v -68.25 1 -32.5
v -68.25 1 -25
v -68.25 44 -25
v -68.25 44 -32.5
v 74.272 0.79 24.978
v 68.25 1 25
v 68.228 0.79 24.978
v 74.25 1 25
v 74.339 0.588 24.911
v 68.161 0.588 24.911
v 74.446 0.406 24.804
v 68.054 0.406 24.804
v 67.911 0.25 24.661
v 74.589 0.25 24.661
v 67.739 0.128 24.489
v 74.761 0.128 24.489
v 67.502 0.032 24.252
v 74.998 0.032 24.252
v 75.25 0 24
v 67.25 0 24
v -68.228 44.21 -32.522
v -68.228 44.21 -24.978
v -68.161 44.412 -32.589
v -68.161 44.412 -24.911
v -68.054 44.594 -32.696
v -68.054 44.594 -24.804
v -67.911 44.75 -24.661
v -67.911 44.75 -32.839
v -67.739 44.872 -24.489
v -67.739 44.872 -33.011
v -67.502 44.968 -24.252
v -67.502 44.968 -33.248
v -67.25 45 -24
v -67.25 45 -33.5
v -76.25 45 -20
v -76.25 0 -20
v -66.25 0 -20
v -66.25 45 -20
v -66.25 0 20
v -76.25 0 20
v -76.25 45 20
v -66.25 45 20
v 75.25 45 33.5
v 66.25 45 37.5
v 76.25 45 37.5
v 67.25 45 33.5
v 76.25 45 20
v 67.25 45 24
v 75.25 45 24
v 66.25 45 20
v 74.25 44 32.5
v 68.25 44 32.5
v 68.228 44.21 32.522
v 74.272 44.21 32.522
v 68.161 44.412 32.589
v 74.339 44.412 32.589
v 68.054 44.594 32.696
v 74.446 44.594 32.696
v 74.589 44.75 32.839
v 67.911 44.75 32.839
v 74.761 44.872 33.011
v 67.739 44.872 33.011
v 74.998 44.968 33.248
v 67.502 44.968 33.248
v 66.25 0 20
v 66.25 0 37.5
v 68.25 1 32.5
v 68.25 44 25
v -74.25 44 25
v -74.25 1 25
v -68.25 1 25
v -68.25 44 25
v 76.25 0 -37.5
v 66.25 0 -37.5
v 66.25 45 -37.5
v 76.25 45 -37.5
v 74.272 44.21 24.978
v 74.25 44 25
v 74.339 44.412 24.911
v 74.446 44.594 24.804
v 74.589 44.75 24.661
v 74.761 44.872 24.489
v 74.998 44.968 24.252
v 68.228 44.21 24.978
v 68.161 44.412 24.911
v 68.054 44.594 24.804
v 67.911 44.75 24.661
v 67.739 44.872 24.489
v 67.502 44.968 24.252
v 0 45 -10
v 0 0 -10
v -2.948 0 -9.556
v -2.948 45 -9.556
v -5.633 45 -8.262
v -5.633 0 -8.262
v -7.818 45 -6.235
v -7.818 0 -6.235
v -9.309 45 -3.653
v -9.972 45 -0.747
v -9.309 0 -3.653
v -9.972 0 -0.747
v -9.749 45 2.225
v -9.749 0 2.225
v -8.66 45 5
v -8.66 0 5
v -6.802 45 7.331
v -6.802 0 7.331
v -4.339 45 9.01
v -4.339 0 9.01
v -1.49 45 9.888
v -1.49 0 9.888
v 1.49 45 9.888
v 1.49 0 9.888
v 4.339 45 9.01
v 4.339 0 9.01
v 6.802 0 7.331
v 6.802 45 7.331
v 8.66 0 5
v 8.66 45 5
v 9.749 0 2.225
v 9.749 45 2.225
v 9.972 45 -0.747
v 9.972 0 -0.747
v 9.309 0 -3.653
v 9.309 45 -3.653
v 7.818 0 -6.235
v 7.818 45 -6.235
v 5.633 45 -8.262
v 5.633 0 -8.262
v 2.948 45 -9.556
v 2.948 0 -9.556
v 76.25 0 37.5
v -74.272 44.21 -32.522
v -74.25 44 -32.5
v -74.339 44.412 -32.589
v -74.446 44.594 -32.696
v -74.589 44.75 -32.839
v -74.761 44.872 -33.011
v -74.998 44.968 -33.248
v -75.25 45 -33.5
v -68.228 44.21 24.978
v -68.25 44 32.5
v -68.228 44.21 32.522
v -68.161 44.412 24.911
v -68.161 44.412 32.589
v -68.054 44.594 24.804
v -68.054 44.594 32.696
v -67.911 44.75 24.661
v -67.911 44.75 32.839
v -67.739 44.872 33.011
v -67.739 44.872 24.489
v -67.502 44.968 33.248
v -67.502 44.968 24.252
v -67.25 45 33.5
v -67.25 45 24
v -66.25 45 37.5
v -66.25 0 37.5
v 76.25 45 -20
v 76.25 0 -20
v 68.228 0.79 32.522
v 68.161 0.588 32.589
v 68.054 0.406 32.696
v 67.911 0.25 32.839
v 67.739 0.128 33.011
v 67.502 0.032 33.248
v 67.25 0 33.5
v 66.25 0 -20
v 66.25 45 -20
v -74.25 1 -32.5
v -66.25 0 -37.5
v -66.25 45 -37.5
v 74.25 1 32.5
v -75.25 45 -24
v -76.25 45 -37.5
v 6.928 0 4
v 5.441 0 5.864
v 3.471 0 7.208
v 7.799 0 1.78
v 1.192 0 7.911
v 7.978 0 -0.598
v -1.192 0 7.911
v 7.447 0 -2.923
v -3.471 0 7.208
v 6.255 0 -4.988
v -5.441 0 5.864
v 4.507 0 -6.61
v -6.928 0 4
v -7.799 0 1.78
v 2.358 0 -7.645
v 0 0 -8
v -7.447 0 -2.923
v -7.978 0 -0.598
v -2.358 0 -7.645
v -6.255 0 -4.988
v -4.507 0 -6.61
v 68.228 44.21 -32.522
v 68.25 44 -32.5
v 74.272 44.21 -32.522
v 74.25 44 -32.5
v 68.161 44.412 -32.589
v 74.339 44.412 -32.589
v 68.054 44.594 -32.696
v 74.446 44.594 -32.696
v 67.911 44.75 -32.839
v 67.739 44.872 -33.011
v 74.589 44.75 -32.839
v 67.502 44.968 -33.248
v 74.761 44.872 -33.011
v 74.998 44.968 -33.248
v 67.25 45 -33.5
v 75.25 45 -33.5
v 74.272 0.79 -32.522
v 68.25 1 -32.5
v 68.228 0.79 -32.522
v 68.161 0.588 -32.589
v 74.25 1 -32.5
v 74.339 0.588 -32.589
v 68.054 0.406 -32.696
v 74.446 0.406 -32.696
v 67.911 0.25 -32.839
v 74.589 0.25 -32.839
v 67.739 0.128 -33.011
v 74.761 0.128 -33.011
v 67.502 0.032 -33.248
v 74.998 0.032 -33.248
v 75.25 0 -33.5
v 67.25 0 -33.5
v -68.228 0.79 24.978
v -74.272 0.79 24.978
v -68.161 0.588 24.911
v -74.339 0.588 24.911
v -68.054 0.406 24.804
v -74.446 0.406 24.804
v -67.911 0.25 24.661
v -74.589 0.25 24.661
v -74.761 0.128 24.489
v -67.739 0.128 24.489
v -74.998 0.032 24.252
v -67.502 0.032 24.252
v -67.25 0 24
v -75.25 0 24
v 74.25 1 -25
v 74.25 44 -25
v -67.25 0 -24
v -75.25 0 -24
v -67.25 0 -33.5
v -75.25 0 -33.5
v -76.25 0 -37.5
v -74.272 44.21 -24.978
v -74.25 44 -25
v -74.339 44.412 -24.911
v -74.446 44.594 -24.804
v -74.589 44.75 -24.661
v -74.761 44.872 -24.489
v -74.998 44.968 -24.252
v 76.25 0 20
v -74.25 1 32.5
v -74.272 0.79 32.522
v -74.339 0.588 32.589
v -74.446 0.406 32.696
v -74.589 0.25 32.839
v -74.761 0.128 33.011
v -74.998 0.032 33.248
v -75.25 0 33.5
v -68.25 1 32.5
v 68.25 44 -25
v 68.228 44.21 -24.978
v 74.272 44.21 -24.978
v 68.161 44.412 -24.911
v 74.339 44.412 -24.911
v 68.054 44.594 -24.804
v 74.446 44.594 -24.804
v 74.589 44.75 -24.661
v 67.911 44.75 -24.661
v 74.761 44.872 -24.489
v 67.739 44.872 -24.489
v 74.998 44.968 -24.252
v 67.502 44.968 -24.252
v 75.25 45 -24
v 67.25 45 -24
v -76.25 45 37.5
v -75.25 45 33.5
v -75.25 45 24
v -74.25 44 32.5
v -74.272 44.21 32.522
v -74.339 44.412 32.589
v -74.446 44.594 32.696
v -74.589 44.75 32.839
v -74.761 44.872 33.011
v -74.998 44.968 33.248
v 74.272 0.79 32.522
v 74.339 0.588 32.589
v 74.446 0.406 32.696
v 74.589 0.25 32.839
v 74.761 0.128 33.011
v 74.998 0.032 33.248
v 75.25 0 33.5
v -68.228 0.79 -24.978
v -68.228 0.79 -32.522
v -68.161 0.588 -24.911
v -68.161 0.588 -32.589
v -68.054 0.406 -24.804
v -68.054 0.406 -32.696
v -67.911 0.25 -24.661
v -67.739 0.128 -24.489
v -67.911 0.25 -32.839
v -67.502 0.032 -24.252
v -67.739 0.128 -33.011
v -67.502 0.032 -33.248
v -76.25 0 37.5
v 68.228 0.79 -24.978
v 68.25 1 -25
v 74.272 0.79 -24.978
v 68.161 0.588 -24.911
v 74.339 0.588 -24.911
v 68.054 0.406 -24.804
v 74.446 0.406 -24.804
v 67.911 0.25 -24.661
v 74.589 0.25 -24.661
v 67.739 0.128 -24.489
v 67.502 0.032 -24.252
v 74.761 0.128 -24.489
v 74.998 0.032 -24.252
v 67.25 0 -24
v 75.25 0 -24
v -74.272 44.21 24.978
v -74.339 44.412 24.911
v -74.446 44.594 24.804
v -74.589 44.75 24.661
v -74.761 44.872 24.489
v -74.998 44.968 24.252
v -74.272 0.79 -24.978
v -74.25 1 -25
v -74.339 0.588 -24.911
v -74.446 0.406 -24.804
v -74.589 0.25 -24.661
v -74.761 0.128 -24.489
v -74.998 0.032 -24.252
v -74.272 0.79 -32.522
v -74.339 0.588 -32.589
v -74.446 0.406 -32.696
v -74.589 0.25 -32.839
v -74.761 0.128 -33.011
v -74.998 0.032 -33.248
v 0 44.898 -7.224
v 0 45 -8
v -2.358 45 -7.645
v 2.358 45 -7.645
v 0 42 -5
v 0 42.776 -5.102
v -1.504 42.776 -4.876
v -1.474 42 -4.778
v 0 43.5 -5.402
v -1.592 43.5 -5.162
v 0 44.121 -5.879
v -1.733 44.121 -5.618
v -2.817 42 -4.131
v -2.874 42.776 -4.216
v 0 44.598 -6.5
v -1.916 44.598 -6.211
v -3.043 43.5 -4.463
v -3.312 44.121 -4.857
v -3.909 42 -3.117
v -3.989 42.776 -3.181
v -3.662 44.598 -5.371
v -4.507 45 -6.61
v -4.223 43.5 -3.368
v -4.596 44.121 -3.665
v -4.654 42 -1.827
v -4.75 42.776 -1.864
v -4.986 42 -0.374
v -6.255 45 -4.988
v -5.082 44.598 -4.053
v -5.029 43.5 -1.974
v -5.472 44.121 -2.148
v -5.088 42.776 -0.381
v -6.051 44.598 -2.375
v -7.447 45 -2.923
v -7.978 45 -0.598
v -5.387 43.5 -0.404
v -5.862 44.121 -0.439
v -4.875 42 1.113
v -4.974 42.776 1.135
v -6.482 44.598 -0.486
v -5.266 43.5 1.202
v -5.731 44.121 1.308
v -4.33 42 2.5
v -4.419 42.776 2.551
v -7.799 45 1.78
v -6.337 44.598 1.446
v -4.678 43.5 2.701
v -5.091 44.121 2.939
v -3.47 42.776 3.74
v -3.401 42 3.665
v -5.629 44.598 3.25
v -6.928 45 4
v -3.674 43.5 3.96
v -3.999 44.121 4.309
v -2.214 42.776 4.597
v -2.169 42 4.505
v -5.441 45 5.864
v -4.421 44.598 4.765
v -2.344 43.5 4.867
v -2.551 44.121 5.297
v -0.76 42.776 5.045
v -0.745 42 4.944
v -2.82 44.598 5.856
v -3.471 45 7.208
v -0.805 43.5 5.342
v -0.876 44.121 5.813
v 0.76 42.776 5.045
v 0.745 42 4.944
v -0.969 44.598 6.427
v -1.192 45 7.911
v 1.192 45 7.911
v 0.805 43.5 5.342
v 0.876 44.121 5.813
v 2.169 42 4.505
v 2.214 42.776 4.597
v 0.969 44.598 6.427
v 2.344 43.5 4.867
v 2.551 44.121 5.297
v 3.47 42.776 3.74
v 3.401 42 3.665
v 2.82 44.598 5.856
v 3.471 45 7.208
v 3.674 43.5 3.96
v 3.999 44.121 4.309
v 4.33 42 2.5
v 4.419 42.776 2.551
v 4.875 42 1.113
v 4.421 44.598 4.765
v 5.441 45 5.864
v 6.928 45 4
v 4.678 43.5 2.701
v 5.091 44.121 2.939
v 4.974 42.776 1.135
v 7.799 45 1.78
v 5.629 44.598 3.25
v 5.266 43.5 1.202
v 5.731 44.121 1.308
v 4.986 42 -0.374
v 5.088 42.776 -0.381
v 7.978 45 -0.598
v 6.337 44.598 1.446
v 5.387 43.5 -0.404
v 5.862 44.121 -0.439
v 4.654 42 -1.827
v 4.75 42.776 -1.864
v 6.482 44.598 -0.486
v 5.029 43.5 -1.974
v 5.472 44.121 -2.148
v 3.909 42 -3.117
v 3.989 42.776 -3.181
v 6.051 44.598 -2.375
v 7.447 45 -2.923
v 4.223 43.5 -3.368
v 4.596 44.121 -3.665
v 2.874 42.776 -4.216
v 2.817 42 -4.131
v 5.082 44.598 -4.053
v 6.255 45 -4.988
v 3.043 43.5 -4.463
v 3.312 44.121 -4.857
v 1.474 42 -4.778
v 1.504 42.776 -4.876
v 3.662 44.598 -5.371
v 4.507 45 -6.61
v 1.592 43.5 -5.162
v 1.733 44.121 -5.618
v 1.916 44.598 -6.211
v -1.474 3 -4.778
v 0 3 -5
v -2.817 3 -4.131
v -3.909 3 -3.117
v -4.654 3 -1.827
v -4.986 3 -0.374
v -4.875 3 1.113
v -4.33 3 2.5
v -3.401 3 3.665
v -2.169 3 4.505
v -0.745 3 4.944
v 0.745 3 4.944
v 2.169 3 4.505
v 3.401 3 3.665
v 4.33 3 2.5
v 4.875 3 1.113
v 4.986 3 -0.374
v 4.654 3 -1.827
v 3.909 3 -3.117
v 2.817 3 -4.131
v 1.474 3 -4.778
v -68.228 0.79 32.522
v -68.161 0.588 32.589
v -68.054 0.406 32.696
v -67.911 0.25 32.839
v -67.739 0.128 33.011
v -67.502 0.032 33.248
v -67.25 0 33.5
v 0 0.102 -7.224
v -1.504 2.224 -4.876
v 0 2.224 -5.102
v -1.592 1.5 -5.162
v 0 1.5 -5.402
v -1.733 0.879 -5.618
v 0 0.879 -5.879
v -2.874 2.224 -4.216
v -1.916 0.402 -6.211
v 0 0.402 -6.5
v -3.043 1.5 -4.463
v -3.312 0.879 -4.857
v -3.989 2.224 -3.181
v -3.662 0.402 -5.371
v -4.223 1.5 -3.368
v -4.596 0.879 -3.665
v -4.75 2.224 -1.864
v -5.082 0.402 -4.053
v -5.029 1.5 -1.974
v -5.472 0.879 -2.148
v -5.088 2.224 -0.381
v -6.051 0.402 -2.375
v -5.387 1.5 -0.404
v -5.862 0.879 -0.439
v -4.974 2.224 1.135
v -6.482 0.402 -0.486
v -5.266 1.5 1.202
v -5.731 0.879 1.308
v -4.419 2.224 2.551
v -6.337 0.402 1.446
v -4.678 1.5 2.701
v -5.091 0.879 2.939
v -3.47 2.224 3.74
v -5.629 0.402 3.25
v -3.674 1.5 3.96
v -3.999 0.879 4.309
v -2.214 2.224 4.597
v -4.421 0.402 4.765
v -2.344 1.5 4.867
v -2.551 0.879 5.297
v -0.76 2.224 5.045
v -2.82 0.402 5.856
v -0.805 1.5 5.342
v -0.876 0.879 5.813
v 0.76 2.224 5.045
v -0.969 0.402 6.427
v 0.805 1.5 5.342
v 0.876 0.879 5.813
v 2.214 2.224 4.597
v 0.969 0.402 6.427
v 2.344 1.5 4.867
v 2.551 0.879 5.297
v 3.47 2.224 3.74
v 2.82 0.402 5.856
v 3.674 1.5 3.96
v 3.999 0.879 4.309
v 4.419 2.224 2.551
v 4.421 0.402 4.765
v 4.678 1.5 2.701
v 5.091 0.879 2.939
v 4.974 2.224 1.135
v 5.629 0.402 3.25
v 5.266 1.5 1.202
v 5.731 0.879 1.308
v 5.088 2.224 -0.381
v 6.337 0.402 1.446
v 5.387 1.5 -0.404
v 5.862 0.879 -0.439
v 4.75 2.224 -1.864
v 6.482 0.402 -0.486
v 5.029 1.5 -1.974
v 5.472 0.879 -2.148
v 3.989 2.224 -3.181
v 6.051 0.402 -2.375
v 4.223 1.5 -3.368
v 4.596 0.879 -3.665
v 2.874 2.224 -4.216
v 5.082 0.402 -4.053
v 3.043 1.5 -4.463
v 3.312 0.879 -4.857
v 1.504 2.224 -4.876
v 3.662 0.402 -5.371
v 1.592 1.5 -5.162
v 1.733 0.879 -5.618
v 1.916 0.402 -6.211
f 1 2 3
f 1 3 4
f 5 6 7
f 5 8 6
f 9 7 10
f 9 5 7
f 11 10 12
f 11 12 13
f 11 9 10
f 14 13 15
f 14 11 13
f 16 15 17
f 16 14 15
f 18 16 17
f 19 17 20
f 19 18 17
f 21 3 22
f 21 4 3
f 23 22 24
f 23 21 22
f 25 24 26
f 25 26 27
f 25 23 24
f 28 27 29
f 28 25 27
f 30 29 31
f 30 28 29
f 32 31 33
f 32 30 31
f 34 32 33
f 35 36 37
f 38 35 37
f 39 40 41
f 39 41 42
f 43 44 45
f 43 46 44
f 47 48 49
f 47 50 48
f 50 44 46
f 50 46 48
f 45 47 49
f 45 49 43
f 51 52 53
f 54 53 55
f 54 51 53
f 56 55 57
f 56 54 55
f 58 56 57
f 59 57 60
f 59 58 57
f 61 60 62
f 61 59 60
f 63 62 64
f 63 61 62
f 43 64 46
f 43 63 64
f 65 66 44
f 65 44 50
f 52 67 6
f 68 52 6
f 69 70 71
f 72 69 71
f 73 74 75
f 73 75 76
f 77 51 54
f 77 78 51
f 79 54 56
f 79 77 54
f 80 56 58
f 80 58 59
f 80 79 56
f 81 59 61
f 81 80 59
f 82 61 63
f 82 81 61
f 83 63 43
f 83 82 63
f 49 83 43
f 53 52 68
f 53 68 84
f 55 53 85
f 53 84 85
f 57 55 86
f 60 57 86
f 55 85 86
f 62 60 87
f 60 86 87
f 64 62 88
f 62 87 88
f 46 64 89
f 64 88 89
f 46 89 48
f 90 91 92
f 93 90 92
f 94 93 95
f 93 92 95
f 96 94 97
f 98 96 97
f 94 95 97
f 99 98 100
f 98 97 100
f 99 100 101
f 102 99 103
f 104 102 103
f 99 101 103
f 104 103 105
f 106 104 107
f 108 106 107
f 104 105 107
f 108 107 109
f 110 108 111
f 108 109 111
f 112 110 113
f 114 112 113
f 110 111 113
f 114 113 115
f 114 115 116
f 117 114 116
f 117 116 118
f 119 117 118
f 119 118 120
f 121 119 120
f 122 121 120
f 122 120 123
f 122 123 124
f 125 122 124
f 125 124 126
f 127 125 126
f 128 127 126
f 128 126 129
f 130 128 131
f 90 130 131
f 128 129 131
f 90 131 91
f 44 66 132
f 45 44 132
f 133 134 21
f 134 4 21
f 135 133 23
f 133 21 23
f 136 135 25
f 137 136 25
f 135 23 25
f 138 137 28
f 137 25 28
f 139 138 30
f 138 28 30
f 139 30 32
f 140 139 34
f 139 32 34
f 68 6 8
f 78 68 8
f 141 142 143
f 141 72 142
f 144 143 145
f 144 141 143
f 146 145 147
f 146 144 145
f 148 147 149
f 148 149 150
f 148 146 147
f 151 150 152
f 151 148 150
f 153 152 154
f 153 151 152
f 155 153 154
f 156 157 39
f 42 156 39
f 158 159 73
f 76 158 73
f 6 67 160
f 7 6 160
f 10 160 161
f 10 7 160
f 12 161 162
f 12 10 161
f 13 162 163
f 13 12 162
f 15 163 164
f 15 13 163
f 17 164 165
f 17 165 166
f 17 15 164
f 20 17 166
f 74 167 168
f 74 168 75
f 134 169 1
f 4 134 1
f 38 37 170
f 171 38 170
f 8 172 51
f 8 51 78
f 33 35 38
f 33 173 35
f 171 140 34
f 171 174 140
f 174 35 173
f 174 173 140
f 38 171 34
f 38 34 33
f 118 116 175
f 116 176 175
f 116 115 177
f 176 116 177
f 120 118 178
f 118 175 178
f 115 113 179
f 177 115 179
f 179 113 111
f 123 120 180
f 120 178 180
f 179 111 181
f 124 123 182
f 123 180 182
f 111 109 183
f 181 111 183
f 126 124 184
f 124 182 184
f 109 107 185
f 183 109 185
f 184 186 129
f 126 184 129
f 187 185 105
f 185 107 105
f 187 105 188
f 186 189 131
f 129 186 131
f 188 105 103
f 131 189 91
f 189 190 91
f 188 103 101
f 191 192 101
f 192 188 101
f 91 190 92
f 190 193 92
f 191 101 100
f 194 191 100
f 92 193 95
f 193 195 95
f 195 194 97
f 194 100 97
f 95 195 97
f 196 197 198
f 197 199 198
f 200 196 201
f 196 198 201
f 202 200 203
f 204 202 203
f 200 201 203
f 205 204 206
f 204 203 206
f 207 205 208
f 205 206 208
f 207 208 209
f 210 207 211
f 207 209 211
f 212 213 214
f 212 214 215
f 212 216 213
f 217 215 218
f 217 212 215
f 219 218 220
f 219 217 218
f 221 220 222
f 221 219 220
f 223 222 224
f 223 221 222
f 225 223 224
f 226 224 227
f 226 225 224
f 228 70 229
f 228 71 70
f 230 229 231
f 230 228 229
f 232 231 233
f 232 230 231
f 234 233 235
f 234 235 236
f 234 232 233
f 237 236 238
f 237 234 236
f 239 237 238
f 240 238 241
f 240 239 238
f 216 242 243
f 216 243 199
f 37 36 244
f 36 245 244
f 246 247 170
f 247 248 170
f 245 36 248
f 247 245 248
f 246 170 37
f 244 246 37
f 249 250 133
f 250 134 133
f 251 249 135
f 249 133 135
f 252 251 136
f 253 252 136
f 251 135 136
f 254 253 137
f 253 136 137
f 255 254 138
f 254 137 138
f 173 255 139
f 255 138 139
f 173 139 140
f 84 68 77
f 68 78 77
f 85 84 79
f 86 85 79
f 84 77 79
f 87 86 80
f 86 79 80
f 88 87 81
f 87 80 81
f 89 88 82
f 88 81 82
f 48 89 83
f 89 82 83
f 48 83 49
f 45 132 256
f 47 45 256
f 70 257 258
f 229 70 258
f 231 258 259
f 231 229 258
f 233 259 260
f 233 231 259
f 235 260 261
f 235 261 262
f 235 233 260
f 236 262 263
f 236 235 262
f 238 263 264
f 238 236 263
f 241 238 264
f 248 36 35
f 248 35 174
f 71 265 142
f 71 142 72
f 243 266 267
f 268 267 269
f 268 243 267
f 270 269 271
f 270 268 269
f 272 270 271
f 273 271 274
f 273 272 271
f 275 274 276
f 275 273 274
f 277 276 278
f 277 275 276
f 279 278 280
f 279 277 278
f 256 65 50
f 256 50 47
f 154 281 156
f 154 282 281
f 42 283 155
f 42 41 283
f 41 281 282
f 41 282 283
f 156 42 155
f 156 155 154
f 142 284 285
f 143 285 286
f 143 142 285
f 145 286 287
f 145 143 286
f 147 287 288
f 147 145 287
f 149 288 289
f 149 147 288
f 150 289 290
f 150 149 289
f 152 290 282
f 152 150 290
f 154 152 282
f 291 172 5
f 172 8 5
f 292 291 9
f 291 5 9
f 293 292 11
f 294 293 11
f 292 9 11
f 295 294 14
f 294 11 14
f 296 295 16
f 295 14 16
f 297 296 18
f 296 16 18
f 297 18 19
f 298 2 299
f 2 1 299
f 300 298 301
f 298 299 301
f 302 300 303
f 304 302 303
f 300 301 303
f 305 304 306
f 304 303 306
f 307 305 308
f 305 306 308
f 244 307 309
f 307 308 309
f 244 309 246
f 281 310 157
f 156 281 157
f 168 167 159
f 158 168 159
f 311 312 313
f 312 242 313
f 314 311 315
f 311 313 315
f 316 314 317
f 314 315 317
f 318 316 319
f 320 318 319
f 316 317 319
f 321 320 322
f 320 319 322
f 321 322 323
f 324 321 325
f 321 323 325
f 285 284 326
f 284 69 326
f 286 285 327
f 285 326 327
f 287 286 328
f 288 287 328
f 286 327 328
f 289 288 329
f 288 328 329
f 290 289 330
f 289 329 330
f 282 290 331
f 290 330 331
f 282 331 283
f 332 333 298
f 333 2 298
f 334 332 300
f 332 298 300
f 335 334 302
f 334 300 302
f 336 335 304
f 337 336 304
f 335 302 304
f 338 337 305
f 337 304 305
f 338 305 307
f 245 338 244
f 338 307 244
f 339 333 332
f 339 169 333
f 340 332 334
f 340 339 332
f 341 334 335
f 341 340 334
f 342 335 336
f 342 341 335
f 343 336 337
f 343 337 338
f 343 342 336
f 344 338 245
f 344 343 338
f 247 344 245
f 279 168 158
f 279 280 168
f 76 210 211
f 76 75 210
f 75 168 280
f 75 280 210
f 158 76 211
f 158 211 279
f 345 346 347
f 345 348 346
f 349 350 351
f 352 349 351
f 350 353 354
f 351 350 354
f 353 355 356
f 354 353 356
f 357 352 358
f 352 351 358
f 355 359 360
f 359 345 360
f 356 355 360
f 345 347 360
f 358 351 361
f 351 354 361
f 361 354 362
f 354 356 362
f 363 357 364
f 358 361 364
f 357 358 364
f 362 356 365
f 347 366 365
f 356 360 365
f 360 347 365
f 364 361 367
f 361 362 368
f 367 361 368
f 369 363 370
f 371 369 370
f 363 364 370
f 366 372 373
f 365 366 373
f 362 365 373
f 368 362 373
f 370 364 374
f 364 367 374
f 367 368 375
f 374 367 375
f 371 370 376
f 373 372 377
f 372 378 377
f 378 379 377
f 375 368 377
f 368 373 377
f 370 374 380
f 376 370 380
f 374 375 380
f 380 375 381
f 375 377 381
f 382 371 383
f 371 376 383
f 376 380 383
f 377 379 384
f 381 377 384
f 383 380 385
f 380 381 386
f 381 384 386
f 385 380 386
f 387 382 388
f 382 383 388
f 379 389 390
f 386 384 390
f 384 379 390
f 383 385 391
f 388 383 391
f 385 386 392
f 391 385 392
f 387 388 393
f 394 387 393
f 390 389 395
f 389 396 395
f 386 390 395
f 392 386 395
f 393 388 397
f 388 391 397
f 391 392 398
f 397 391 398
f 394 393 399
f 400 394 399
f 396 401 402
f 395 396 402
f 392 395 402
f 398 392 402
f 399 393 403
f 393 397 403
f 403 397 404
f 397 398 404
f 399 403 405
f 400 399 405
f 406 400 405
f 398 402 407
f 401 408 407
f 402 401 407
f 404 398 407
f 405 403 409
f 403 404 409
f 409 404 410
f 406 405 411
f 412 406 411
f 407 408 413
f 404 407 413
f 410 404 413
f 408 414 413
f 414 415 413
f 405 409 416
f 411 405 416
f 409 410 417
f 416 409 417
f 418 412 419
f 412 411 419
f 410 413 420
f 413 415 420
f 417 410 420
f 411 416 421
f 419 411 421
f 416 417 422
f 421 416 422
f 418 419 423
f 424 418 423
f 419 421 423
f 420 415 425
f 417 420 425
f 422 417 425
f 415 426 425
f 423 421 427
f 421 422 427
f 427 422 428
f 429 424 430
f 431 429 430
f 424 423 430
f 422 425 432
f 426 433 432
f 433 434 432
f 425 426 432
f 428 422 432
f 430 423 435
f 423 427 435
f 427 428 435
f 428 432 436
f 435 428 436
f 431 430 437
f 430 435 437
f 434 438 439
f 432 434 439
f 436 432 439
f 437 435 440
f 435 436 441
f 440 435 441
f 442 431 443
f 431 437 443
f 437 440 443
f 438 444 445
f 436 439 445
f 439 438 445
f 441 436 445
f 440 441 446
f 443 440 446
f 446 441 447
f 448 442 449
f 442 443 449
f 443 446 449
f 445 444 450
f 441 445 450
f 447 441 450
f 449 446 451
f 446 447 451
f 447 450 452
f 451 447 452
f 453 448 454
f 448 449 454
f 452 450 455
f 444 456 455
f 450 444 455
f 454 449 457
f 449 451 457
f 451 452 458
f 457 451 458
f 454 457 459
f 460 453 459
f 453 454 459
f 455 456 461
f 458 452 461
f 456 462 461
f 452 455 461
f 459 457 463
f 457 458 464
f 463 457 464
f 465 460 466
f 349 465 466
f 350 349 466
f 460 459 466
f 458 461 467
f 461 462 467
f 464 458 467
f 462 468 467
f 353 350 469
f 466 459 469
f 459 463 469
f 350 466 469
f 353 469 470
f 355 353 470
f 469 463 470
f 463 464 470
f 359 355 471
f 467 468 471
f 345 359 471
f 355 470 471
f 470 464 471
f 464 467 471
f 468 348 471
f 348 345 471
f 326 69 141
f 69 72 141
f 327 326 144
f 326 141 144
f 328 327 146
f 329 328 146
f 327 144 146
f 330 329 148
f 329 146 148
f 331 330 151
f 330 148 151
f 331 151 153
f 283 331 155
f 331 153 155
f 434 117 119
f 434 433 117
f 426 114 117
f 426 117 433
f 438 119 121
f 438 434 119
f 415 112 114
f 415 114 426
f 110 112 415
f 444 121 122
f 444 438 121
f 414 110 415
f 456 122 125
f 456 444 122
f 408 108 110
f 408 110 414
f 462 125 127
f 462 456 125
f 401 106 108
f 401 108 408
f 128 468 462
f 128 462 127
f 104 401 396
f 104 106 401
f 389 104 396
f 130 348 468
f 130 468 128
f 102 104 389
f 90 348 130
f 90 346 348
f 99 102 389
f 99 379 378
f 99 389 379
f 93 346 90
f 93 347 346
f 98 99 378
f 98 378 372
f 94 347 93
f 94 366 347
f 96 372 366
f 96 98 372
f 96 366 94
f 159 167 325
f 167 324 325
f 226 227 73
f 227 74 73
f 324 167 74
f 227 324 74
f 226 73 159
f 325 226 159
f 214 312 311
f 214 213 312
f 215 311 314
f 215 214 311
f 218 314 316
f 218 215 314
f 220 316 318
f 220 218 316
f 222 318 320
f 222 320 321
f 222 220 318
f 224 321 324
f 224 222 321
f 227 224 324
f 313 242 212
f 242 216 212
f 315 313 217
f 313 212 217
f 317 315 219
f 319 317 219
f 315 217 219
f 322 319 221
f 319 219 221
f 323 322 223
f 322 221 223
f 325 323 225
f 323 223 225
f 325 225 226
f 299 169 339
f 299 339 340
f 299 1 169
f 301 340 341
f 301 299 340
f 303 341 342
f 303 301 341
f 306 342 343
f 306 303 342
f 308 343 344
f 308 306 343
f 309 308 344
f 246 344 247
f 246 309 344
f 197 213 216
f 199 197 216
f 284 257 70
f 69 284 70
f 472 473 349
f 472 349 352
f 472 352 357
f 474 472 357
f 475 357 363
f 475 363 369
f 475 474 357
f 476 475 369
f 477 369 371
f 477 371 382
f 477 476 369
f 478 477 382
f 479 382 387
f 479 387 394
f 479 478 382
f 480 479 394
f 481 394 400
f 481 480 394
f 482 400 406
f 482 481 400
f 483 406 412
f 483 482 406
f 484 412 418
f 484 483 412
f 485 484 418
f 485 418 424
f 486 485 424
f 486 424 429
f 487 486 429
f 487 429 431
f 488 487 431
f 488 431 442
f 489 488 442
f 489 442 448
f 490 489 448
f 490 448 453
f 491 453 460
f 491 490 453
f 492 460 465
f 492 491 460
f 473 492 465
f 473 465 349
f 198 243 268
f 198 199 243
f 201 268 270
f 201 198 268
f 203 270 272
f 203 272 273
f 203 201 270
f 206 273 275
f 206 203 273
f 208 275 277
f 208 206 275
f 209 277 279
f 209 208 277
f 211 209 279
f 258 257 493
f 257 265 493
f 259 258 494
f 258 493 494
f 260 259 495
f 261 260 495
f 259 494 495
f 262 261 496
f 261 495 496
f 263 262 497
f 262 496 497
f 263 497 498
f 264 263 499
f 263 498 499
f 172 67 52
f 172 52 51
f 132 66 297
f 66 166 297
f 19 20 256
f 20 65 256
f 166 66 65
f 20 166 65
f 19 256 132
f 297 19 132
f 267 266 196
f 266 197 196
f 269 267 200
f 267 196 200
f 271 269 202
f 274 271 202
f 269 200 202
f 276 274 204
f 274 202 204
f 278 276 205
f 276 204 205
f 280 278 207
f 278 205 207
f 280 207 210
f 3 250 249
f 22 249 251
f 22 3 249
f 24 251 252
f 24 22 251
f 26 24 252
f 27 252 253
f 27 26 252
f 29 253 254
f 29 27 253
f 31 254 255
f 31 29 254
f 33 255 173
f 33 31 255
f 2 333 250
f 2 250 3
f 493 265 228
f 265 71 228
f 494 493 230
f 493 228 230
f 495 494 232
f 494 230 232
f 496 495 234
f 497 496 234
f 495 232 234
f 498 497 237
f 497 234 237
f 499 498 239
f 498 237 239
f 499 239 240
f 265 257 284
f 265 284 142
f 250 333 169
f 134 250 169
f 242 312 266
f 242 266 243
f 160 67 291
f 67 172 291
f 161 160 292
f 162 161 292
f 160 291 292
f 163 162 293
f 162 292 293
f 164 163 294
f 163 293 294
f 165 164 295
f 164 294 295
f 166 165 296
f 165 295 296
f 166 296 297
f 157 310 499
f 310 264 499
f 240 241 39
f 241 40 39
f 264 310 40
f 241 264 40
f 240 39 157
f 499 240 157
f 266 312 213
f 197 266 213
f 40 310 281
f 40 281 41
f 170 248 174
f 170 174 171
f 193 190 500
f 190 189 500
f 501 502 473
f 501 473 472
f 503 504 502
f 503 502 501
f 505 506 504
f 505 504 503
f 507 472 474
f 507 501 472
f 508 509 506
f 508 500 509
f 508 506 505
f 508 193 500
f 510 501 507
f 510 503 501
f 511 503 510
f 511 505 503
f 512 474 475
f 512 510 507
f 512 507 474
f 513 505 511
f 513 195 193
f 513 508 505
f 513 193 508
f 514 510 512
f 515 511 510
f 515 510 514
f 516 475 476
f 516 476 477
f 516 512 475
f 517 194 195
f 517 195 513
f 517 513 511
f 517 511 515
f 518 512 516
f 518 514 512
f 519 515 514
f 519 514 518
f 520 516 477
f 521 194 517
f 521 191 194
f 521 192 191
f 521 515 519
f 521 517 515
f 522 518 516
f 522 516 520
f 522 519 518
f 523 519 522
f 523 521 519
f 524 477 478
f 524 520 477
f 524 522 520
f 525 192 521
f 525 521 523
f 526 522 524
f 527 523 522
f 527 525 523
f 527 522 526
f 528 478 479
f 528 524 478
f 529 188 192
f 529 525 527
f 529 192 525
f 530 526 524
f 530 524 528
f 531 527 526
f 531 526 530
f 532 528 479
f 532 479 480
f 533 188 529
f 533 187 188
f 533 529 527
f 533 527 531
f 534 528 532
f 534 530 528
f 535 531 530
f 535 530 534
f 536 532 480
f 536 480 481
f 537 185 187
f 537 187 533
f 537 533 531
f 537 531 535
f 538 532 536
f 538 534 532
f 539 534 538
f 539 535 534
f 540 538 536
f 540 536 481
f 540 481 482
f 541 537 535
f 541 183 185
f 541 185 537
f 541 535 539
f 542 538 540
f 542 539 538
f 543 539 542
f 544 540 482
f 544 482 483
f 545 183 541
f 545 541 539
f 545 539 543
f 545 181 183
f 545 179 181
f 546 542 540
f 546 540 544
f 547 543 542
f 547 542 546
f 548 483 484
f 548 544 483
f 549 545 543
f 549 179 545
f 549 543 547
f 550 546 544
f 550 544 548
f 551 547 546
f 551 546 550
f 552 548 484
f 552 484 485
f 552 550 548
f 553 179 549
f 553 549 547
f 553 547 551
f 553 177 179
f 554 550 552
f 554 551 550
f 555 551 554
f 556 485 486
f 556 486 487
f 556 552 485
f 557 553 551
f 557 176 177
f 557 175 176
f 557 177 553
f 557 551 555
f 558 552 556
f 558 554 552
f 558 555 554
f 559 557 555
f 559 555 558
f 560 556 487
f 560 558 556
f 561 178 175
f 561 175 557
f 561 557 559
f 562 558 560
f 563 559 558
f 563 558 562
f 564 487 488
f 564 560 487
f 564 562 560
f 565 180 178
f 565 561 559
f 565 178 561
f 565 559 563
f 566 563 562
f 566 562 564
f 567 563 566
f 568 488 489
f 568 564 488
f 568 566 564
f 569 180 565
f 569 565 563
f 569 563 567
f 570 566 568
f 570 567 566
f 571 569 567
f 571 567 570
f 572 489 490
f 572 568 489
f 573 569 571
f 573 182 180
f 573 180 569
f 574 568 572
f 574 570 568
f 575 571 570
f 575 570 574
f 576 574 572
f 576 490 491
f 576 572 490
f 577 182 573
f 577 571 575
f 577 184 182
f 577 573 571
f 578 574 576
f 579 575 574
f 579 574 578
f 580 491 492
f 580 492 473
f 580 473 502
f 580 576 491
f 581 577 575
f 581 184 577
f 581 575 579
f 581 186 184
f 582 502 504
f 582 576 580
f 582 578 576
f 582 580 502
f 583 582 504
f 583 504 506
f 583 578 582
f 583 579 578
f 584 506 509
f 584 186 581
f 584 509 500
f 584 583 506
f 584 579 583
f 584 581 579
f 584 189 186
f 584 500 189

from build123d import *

# Parameters (mm, degrees)
SKETCH1_R             = 10
SKETCH1_R_2           = 5
BOSS_EXTRUDE1_DEPTH   = 45
SKETCH1_W             = 10
SKETCH1_H             = 17.5
SKETCH1_W_2           = 6
SKETCH1_H_2           = 7.5
BOSS_EXTRUDE1_2_DEPTH = 45
BOSS_EXTRUDE1_3_DEPTH = 45
BOSS_EXTRUDE1_4_DEPTH = 45
BOSS_EXTRUDE1_5_DEPTH = 45
FILLET1_R             = 1
FILLET2_R             = 1
FILLET3_R             = 1
FILLET4_R             = 1
FILLET5_R             = 3


with BuildPart() as part:
    # Sketch1 → Boss-Extrude1 (new body)
    with BuildSketch(Plane(origin=(0, 0, 0), x_dir=(1, 0, 0), z_dir=(0, 1, 0))):
        with Locations(Location((0, 0, 0), (0, 0, 90))):
            Circle(SKETCH1_R)
        with Locations(Location((0, 0, 0), (0, 0, 90))):
            Circle(SKETCH1_R_2, mode=Mode.SUBTRACT)
    extrude(amount=BOSS_EXTRUDE1_DEPTH)

    # Fillet5
    fillet5_edges = [part.edges().sort_by_distance(p)[0] for p in [
        (0, 0, 5),
        (0, 45, 5),
    ]]
    fillet(fillet5_edges, radius=FILLET5_R)


with BuildPart() as body_2:
    # Sketch1 → Boss-Extrude1 2 (new body)
    with BuildSketch(Plane(origin=(0, 0, 0), x_dir=(1, 0, 0), z_dir=(0, 1, 0))):
        with Locations((-71.25, -28.75)):
            Rectangle(SKETCH1_W, SKETCH1_H)
        with Locations((-71.25, -28.75)):
            Rectangle(SKETCH1_W_2, SKETCH1_H_2, mode=Mode.SUBTRACT)
    extrude(amount=BOSS_EXTRUDE1_2_DEPTH)

    # Fillet2
    fillet2_edges = [body_2.edges().sort_by_distance(p)[0] for p in [
        (-68.25, 0, 28.75),
        (-71.25, 0, 25),
        (-74.25, 0, 28.75),
        (-71.25, 0, 32.5),
        (-71.25, 45, 32.5),
        (-74.25, 45, 28.75),
        (-71.25, 45, 25),
        (-68.25, 45, 28.75),
    ]]
    fillet(fillet2_edges, radius=FILLET2_R)


with BuildPart() as body_3:
    # Sketch1 → Boss-Extrude1 3 (new body)
    with BuildSketch(Plane(origin=(0, 0, 0), x_dir=(1, 0, 0), z_dir=(0, 1, 0))):
        with Locations((-71.25, 28.75)):
            Rectangle(SKETCH1_W, SKETCH1_H)
        with Locations((-71.25, 28.75)):
            Rectangle(SKETCH1_W_2, SKETCH1_H_2, mode=Mode.SUBTRACT)
    extrude(amount=BOSS_EXTRUDE1_3_DEPTH)

    # Fillet1
    fillet1_edges = [body_3.edges().sort_by_distance(p)[0] for p in [
        (-74.25, 0, -28.75),
        (-71.25, 0, -25),
        (-68.25, 0, -28.75),
        (-71.25, 0, -32.5),
        (-71.25, 45, -32.5),
        (-68.25, 45, -28.75),
        (-71.25, 45, -25),
        (-74.25, 45, -28.75),
    ]]
    fillet(fillet1_edges, radius=FILLET1_R)


with BuildPart() as body_4:
    # Sketch1 → Boss-Extrude1 4 (new body)
    with BuildSketch(Plane(origin=(0, 0, 0), x_dir=(1, 0, 0), z_dir=(0, 1, 0))):
        with Locations((71.25, 28.75)):
            Rectangle(SKETCH1_W, SKETCH1_H)
        with Locations((71.25, 28.75)):
            Rectangle(SKETCH1_W_2, SKETCH1_H_2, mode=Mode.SUBTRACT)
    extrude(amount=BOSS_EXTRUDE1_4_DEPTH)

    # Fillet4
    fillet4_edges = [body_4.edges().sort_by_distance(p)[0] for p in [
        (68.25, 0, -28.75),
        (71.25, 0, -25),
        (74.25, 0, -28.75),
        (71.25, 0, -32.5),
        (71.25, 45, -32.5),
        (74.25, 45, -28.75),
        (71.25, 45, -25),
        (68.25, 45, -28.75),
    ]]
    fillet(fillet4_edges, radius=FILLET4_R)


with BuildPart() as body_5:
    # Sketch1 → Boss-Extrude1 5 (new body)
    with BuildSketch(Plane(origin=(0, 0, 0), x_dir=(1, 0, 0), z_dir=(0, 1, 0))):
        with Locations((71.25, -28.75)):
            Rectangle(SKETCH1_W, SKETCH1_H)
        with Locations((71.25, -28.75)):
            Rectangle(SKETCH1_W_2, SKETCH1_H_2, mode=Mode.SUBTRACT)
    extrude(amount=BOSS_EXTRUDE1_5_DEPTH)

    # Fillet3
    fillet3_edges = [body_5.edges().sort_by_distance(p)[0] for p in [
        (68.25, 0, 28.75),
        (71.25, 0, 32.5),
        (74.25, 0, 28.75),
        (71.25, 0, 25),
        (71.25, 45, 25),
        (74.25, 45, 28.75),
        (71.25, 45, 32.5),
        (68.25, 45, 28.75),
    ]]
    fillet(fillet3_edges, radius=FILLET3_R)


solid = Compound([part.part, body_2.part, body_3.part, body_4.part, body_5.part])
